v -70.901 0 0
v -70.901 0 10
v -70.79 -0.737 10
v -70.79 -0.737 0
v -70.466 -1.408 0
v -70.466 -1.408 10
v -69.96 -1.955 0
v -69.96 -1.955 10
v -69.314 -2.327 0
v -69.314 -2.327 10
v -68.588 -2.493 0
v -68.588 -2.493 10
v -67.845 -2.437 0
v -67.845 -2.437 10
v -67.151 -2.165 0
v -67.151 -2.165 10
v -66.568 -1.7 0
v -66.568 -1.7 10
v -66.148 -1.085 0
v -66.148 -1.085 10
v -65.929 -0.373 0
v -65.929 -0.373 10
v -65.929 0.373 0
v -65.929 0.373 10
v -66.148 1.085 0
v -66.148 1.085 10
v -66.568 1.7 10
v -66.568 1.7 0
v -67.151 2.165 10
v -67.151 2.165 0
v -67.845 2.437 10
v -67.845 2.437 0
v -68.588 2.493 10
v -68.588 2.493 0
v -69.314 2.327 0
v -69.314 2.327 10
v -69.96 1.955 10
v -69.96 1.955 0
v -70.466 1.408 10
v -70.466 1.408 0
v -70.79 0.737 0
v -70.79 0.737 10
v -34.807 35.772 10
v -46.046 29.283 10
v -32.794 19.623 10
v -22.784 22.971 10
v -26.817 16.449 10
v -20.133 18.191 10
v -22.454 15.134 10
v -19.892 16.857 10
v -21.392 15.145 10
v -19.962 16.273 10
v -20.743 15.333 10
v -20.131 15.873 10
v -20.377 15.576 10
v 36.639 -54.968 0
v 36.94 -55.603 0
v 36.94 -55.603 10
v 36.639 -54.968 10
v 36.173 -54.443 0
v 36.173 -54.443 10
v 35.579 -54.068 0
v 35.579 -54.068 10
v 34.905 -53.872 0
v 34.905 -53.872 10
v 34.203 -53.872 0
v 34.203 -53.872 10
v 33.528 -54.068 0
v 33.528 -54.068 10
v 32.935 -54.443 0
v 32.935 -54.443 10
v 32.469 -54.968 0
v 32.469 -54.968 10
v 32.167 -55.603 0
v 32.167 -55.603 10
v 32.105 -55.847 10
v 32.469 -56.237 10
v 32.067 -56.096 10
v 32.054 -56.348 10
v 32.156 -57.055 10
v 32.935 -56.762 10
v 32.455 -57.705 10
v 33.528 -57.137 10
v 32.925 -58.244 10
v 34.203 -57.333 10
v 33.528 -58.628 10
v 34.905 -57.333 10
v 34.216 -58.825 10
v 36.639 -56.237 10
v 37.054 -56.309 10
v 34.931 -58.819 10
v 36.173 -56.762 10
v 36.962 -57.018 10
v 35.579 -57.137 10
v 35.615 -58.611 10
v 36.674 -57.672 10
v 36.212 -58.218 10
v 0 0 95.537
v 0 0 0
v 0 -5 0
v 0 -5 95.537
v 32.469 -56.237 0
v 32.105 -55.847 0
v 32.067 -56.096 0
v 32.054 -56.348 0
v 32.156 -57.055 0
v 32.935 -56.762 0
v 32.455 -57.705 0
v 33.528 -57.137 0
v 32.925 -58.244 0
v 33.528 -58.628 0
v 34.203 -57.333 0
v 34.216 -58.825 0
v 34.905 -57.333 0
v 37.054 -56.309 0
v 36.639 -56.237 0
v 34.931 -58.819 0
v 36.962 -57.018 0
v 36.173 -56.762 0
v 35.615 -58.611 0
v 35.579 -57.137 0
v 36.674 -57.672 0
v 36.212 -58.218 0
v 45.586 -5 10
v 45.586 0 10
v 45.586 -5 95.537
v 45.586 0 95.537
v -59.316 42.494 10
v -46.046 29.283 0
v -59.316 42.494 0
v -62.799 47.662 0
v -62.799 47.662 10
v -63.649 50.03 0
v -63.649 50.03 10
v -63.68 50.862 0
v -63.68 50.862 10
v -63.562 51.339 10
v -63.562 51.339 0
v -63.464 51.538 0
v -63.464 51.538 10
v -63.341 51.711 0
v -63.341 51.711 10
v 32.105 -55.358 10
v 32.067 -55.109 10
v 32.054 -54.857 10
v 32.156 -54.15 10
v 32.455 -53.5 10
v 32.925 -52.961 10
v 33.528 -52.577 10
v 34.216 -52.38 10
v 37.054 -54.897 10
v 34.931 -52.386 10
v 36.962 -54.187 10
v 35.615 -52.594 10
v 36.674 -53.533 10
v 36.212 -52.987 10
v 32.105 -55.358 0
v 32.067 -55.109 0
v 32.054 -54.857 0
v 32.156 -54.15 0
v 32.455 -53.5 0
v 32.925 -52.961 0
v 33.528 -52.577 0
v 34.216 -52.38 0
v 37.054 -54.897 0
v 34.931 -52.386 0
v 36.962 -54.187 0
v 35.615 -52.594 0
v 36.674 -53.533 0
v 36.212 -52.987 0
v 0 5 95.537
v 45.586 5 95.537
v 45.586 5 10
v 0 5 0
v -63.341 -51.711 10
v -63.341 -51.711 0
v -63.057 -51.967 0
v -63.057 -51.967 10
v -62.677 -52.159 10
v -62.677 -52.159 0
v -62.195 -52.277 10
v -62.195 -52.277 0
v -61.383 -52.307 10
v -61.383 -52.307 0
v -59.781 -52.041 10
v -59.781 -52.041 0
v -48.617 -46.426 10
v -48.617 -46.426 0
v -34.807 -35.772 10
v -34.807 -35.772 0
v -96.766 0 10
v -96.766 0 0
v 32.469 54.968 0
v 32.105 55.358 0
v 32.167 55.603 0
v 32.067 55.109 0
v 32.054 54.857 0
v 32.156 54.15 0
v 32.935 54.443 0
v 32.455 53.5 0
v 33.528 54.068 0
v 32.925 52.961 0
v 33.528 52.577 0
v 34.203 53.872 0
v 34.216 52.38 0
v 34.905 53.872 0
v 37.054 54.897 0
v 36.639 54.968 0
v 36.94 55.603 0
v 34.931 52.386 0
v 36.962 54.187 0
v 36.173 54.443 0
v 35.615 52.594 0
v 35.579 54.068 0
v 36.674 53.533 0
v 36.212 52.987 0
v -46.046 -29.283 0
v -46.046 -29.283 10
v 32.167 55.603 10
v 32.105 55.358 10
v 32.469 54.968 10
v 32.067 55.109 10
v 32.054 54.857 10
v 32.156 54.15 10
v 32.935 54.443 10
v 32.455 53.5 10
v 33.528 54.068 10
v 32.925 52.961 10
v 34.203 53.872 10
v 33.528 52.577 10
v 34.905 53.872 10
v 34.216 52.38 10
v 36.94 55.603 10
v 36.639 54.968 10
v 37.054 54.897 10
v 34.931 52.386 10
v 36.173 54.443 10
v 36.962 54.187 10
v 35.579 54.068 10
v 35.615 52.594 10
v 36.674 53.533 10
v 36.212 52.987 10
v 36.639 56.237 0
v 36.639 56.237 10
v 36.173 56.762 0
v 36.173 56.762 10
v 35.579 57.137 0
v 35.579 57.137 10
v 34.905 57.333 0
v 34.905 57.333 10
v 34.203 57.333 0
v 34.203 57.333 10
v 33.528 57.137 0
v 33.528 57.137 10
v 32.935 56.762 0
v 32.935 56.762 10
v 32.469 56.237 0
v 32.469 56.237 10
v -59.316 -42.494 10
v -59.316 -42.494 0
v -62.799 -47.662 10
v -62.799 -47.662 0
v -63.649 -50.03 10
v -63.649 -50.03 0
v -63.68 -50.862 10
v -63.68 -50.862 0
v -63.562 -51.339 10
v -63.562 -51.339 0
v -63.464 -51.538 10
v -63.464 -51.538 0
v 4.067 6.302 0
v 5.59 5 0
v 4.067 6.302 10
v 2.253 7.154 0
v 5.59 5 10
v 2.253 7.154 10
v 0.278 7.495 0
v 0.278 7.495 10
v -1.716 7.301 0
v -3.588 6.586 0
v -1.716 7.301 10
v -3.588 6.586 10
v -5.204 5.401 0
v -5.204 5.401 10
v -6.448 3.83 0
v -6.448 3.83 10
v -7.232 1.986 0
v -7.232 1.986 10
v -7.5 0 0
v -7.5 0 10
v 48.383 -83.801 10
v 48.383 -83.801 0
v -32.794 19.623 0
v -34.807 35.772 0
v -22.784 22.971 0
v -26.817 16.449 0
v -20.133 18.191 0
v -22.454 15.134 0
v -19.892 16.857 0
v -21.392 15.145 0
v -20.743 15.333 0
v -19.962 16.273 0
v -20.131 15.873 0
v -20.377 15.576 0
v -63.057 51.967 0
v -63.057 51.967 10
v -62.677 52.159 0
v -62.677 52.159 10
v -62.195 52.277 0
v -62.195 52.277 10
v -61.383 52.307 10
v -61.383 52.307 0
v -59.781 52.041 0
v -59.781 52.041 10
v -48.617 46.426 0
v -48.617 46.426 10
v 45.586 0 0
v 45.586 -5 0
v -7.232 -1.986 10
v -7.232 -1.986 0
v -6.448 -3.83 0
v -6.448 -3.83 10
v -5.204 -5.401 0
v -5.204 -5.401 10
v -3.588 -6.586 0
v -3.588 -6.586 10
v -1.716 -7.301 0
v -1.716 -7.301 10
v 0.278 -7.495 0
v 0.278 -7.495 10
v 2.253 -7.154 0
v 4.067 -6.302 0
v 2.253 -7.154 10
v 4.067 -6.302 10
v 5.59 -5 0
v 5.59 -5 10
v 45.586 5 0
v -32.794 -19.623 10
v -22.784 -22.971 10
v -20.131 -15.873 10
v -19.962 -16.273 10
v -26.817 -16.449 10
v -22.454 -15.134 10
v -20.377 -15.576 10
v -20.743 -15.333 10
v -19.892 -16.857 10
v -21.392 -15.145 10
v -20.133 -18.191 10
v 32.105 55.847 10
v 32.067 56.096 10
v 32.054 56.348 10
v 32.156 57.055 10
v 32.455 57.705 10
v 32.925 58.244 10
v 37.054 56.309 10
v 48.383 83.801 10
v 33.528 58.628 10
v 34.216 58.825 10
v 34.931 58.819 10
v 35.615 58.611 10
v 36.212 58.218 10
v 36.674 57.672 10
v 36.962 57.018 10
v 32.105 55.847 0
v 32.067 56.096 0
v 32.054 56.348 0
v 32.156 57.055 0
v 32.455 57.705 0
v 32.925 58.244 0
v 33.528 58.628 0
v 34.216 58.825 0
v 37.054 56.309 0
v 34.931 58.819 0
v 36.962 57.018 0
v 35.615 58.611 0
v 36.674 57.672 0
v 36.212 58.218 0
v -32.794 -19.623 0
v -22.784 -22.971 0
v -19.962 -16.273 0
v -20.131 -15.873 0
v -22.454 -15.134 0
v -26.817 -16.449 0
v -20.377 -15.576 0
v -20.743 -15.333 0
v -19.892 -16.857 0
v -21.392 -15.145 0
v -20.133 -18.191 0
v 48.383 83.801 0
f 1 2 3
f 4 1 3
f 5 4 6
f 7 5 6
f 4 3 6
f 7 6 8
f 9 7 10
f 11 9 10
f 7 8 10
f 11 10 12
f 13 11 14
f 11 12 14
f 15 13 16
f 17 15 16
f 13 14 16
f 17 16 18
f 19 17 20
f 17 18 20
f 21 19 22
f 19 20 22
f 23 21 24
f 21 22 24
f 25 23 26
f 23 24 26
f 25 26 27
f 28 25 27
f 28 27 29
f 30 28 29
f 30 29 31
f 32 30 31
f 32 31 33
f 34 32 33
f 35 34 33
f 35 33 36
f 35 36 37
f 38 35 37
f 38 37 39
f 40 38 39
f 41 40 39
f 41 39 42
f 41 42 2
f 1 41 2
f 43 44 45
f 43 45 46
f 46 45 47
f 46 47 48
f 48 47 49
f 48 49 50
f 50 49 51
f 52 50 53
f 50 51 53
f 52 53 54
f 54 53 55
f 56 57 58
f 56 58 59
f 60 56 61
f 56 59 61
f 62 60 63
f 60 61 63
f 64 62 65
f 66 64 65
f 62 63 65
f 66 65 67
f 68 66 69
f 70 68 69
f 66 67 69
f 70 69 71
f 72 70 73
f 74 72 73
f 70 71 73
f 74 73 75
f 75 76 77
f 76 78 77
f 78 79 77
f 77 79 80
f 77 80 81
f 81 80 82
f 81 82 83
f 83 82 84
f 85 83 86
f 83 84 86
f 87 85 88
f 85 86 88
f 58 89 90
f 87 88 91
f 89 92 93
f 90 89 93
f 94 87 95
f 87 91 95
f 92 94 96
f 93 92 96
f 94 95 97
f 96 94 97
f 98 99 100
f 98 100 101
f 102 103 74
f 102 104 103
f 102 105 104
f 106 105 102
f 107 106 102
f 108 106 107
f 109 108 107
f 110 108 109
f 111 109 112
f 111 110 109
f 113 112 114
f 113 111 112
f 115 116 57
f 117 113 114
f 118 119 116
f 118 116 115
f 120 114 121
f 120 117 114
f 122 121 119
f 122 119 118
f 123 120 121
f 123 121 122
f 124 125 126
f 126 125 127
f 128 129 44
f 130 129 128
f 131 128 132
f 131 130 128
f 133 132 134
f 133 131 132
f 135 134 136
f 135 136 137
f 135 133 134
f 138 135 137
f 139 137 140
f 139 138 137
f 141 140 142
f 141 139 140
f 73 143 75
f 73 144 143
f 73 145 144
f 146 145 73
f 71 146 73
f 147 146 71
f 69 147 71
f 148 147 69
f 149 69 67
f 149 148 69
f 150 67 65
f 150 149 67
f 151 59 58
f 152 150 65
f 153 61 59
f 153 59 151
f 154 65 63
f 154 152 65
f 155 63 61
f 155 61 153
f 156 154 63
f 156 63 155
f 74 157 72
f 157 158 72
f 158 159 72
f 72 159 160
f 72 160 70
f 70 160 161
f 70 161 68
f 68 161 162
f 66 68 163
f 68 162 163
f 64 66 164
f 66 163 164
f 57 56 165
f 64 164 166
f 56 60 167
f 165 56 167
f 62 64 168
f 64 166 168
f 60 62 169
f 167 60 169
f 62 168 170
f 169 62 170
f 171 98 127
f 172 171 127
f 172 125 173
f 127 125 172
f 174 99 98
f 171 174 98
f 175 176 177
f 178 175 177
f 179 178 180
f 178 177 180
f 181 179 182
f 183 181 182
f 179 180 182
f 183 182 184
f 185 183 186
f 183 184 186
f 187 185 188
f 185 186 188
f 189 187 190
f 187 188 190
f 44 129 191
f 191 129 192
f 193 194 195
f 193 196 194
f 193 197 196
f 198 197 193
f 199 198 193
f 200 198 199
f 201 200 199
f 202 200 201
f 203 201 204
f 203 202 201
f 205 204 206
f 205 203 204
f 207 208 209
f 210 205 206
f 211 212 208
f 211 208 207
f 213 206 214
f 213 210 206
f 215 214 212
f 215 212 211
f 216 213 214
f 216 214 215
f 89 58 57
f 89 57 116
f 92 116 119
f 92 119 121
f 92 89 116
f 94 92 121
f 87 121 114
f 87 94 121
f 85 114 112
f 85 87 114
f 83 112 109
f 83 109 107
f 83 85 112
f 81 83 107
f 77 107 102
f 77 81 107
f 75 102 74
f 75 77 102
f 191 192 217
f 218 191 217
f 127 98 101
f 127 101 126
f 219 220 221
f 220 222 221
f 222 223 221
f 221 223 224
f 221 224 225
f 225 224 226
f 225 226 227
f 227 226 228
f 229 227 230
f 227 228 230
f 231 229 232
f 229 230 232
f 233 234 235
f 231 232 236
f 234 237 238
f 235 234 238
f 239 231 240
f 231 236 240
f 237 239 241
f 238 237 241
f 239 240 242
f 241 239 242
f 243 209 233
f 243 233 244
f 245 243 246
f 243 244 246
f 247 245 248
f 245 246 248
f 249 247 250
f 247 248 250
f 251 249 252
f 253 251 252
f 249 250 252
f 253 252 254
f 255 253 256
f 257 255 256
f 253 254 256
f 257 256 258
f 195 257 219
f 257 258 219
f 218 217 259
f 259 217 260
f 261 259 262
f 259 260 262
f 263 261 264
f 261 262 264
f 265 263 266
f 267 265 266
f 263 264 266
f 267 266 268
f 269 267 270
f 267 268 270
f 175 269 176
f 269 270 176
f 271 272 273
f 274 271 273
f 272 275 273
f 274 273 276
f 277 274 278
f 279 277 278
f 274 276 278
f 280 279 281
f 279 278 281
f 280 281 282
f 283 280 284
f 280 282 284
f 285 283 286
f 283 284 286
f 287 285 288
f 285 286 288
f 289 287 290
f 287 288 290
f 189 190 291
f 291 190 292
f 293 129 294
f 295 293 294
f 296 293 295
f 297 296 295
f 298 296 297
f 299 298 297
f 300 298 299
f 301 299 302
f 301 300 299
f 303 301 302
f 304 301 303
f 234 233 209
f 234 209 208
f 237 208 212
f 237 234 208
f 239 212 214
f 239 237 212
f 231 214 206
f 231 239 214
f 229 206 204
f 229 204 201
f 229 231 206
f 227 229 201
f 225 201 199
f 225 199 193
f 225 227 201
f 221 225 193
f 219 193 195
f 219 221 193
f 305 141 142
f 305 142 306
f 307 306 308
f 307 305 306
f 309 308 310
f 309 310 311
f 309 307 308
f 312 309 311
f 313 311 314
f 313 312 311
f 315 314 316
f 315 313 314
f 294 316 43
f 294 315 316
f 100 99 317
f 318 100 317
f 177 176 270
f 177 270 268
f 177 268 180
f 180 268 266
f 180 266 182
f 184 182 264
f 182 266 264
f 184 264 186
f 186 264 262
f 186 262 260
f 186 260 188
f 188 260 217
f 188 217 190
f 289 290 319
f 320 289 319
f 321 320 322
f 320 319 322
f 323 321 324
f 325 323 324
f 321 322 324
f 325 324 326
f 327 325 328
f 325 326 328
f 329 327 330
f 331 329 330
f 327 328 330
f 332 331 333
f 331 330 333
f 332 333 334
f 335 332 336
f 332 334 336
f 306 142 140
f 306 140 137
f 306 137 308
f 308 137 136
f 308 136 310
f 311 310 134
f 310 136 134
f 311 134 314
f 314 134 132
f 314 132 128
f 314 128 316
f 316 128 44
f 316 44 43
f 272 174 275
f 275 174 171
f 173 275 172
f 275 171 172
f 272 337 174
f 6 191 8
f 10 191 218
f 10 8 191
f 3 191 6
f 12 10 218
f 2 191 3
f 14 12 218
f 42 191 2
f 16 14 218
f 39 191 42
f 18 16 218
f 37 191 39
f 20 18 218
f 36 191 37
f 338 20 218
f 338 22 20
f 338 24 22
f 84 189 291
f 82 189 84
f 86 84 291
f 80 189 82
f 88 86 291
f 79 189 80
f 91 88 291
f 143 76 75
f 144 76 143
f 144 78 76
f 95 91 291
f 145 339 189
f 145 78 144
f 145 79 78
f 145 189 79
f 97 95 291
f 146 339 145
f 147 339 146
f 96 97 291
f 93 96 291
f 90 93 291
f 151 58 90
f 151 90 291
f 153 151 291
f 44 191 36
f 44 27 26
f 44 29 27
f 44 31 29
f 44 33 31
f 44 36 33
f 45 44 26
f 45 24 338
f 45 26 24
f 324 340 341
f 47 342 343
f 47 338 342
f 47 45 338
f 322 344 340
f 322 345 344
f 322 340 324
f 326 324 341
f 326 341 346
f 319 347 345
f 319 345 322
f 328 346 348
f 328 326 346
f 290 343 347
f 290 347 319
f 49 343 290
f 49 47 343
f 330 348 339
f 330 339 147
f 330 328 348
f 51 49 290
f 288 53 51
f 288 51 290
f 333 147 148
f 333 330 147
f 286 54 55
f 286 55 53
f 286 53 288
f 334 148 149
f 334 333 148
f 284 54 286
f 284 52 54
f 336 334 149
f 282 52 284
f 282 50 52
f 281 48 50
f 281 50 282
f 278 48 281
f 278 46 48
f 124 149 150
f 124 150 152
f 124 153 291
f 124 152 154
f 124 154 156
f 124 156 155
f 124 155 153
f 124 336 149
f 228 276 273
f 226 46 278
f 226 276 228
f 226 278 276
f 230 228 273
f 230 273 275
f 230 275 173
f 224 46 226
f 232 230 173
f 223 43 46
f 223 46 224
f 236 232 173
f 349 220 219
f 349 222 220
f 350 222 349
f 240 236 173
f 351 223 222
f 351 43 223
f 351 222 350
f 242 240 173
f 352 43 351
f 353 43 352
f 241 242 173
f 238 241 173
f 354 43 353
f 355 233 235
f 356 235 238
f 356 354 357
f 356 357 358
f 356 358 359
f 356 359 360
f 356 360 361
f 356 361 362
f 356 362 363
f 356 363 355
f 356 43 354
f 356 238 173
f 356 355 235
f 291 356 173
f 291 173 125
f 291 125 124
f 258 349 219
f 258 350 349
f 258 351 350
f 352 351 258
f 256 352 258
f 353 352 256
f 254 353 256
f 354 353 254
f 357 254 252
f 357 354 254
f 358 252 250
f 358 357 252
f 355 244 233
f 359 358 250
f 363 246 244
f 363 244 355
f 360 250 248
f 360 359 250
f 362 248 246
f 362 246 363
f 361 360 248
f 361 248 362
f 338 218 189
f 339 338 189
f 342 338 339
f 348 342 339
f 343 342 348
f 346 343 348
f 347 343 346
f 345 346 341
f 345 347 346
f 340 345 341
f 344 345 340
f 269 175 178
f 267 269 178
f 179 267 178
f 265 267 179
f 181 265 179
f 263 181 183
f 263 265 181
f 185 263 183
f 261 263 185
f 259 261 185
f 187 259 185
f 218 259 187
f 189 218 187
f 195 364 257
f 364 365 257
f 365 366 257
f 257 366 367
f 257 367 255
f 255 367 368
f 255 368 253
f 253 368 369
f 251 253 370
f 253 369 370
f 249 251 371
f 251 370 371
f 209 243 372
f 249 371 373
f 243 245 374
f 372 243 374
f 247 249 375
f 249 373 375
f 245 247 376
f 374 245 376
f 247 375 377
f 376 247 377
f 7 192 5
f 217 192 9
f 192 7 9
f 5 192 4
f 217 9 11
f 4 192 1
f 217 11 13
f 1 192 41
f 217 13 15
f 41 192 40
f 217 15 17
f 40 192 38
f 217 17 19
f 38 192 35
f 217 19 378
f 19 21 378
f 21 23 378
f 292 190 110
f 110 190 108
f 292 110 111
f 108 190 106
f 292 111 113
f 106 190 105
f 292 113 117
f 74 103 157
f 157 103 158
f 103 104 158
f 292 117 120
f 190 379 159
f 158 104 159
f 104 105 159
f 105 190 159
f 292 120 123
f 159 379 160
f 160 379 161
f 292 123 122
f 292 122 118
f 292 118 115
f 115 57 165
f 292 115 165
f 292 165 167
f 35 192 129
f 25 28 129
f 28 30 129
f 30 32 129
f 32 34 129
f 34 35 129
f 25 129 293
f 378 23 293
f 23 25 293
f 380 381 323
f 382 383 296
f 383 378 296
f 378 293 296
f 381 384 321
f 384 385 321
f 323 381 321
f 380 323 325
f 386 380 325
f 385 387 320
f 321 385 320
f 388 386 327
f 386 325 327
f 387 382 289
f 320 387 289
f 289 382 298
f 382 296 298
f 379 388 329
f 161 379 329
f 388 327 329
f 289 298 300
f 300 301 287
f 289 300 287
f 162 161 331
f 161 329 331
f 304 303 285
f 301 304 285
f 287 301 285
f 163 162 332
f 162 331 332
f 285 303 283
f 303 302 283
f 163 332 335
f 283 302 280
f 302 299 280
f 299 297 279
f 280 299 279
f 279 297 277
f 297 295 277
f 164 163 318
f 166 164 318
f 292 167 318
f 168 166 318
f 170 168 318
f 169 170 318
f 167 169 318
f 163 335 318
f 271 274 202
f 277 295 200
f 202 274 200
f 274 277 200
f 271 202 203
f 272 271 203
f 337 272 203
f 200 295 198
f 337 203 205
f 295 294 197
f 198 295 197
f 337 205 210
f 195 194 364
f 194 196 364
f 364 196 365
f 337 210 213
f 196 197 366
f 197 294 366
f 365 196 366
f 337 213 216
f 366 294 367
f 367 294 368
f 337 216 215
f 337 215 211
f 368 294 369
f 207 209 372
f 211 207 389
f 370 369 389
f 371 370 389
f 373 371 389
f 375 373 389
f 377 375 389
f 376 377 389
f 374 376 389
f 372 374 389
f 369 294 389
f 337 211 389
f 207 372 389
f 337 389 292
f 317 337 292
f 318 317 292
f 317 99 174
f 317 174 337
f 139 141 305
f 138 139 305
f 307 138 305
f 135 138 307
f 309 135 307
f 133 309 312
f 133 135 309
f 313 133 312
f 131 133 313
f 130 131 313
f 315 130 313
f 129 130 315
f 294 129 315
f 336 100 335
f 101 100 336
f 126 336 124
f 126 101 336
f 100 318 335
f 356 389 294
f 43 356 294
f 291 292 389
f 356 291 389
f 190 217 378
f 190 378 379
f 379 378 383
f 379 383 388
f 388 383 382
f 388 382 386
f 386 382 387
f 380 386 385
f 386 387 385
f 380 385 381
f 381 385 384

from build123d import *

# Parameters (mm, degrees)
F2_DEPTH  = 10
F3_D      = 5
F5_D      = 15
F7_DEPTH  = 10
F9_W      = 45.585658
F9_H      = 95.536649
F10_DEPTH = 5


with BuildPart() as f2:
    # F0 (on Top) → F2 (new body)
    with BuildSketch(Plane.XY):
        Polygon((48.382759, -83.801397), (48.382759, 83.801397), (-96.765518, 0), align=None)
    extrude(amount=F2_DEPTH)

    # F3 (through all)
    with Locations(Plane(origin=(0, 0, 0), x_dir=(1, 0, 0), z_dir=(0, 0, -1))):
        with Locations((34.553833, 56.347717), (34.553833, -54.857418), (-68.400823, 0)):
            Hole(F3_D / 2)

    # F5 (through all)
    with Locations(Plane(origin=(0, 0, 0), x_dir=(1, 0, 0), z_dir=(0, 0, -1))):
        with Locations((0, 0)):
            Hole(F5_D / 2)

    # F6 (on Top) → F7 (join)
    with BuildSketch(Plane.XY):
        with BuildLine():
            add(Edge.make_bspline(
                [(-63.340895, -51.710829), (-56.539959, -59.852008), (-27.619903, -28.781666), (1.300152, 2.288677), (-34.420839, -20.640487), (-70.141831, -43.56965), (-63.340895, -51.710829)],
                knots=[0, 0, 0, 2.094395, 2.094395, 4.18879, 4.18879, 6.283185, 6.283185, 6.283185], degree=2, weights=[1, 0.5, 1, 0.5, 1, 0.5, 1]))
        make_face()
    extrude(amount=F7_DEPTH)

    # F8: F2 across plane


with BuildPart() as f2_1:
    add(f2.part)
    add(f2.part.mirror(Plane.XZ))

    # F9 (on Front) → F10 (join)
    with BuildSketch(Plane.XZ):
        with Locations((22.792829, 47.768324)):
            Rectangle(F9_W, F9_H)
    extrude(amount=F10_DEPTH)

    # F11: F2 across plane


with BuildPart() as f2_2:
    add(f2_1.part)
    add(f2_1.part.mirror(Plane.XZ))


solid = f2_2.part
